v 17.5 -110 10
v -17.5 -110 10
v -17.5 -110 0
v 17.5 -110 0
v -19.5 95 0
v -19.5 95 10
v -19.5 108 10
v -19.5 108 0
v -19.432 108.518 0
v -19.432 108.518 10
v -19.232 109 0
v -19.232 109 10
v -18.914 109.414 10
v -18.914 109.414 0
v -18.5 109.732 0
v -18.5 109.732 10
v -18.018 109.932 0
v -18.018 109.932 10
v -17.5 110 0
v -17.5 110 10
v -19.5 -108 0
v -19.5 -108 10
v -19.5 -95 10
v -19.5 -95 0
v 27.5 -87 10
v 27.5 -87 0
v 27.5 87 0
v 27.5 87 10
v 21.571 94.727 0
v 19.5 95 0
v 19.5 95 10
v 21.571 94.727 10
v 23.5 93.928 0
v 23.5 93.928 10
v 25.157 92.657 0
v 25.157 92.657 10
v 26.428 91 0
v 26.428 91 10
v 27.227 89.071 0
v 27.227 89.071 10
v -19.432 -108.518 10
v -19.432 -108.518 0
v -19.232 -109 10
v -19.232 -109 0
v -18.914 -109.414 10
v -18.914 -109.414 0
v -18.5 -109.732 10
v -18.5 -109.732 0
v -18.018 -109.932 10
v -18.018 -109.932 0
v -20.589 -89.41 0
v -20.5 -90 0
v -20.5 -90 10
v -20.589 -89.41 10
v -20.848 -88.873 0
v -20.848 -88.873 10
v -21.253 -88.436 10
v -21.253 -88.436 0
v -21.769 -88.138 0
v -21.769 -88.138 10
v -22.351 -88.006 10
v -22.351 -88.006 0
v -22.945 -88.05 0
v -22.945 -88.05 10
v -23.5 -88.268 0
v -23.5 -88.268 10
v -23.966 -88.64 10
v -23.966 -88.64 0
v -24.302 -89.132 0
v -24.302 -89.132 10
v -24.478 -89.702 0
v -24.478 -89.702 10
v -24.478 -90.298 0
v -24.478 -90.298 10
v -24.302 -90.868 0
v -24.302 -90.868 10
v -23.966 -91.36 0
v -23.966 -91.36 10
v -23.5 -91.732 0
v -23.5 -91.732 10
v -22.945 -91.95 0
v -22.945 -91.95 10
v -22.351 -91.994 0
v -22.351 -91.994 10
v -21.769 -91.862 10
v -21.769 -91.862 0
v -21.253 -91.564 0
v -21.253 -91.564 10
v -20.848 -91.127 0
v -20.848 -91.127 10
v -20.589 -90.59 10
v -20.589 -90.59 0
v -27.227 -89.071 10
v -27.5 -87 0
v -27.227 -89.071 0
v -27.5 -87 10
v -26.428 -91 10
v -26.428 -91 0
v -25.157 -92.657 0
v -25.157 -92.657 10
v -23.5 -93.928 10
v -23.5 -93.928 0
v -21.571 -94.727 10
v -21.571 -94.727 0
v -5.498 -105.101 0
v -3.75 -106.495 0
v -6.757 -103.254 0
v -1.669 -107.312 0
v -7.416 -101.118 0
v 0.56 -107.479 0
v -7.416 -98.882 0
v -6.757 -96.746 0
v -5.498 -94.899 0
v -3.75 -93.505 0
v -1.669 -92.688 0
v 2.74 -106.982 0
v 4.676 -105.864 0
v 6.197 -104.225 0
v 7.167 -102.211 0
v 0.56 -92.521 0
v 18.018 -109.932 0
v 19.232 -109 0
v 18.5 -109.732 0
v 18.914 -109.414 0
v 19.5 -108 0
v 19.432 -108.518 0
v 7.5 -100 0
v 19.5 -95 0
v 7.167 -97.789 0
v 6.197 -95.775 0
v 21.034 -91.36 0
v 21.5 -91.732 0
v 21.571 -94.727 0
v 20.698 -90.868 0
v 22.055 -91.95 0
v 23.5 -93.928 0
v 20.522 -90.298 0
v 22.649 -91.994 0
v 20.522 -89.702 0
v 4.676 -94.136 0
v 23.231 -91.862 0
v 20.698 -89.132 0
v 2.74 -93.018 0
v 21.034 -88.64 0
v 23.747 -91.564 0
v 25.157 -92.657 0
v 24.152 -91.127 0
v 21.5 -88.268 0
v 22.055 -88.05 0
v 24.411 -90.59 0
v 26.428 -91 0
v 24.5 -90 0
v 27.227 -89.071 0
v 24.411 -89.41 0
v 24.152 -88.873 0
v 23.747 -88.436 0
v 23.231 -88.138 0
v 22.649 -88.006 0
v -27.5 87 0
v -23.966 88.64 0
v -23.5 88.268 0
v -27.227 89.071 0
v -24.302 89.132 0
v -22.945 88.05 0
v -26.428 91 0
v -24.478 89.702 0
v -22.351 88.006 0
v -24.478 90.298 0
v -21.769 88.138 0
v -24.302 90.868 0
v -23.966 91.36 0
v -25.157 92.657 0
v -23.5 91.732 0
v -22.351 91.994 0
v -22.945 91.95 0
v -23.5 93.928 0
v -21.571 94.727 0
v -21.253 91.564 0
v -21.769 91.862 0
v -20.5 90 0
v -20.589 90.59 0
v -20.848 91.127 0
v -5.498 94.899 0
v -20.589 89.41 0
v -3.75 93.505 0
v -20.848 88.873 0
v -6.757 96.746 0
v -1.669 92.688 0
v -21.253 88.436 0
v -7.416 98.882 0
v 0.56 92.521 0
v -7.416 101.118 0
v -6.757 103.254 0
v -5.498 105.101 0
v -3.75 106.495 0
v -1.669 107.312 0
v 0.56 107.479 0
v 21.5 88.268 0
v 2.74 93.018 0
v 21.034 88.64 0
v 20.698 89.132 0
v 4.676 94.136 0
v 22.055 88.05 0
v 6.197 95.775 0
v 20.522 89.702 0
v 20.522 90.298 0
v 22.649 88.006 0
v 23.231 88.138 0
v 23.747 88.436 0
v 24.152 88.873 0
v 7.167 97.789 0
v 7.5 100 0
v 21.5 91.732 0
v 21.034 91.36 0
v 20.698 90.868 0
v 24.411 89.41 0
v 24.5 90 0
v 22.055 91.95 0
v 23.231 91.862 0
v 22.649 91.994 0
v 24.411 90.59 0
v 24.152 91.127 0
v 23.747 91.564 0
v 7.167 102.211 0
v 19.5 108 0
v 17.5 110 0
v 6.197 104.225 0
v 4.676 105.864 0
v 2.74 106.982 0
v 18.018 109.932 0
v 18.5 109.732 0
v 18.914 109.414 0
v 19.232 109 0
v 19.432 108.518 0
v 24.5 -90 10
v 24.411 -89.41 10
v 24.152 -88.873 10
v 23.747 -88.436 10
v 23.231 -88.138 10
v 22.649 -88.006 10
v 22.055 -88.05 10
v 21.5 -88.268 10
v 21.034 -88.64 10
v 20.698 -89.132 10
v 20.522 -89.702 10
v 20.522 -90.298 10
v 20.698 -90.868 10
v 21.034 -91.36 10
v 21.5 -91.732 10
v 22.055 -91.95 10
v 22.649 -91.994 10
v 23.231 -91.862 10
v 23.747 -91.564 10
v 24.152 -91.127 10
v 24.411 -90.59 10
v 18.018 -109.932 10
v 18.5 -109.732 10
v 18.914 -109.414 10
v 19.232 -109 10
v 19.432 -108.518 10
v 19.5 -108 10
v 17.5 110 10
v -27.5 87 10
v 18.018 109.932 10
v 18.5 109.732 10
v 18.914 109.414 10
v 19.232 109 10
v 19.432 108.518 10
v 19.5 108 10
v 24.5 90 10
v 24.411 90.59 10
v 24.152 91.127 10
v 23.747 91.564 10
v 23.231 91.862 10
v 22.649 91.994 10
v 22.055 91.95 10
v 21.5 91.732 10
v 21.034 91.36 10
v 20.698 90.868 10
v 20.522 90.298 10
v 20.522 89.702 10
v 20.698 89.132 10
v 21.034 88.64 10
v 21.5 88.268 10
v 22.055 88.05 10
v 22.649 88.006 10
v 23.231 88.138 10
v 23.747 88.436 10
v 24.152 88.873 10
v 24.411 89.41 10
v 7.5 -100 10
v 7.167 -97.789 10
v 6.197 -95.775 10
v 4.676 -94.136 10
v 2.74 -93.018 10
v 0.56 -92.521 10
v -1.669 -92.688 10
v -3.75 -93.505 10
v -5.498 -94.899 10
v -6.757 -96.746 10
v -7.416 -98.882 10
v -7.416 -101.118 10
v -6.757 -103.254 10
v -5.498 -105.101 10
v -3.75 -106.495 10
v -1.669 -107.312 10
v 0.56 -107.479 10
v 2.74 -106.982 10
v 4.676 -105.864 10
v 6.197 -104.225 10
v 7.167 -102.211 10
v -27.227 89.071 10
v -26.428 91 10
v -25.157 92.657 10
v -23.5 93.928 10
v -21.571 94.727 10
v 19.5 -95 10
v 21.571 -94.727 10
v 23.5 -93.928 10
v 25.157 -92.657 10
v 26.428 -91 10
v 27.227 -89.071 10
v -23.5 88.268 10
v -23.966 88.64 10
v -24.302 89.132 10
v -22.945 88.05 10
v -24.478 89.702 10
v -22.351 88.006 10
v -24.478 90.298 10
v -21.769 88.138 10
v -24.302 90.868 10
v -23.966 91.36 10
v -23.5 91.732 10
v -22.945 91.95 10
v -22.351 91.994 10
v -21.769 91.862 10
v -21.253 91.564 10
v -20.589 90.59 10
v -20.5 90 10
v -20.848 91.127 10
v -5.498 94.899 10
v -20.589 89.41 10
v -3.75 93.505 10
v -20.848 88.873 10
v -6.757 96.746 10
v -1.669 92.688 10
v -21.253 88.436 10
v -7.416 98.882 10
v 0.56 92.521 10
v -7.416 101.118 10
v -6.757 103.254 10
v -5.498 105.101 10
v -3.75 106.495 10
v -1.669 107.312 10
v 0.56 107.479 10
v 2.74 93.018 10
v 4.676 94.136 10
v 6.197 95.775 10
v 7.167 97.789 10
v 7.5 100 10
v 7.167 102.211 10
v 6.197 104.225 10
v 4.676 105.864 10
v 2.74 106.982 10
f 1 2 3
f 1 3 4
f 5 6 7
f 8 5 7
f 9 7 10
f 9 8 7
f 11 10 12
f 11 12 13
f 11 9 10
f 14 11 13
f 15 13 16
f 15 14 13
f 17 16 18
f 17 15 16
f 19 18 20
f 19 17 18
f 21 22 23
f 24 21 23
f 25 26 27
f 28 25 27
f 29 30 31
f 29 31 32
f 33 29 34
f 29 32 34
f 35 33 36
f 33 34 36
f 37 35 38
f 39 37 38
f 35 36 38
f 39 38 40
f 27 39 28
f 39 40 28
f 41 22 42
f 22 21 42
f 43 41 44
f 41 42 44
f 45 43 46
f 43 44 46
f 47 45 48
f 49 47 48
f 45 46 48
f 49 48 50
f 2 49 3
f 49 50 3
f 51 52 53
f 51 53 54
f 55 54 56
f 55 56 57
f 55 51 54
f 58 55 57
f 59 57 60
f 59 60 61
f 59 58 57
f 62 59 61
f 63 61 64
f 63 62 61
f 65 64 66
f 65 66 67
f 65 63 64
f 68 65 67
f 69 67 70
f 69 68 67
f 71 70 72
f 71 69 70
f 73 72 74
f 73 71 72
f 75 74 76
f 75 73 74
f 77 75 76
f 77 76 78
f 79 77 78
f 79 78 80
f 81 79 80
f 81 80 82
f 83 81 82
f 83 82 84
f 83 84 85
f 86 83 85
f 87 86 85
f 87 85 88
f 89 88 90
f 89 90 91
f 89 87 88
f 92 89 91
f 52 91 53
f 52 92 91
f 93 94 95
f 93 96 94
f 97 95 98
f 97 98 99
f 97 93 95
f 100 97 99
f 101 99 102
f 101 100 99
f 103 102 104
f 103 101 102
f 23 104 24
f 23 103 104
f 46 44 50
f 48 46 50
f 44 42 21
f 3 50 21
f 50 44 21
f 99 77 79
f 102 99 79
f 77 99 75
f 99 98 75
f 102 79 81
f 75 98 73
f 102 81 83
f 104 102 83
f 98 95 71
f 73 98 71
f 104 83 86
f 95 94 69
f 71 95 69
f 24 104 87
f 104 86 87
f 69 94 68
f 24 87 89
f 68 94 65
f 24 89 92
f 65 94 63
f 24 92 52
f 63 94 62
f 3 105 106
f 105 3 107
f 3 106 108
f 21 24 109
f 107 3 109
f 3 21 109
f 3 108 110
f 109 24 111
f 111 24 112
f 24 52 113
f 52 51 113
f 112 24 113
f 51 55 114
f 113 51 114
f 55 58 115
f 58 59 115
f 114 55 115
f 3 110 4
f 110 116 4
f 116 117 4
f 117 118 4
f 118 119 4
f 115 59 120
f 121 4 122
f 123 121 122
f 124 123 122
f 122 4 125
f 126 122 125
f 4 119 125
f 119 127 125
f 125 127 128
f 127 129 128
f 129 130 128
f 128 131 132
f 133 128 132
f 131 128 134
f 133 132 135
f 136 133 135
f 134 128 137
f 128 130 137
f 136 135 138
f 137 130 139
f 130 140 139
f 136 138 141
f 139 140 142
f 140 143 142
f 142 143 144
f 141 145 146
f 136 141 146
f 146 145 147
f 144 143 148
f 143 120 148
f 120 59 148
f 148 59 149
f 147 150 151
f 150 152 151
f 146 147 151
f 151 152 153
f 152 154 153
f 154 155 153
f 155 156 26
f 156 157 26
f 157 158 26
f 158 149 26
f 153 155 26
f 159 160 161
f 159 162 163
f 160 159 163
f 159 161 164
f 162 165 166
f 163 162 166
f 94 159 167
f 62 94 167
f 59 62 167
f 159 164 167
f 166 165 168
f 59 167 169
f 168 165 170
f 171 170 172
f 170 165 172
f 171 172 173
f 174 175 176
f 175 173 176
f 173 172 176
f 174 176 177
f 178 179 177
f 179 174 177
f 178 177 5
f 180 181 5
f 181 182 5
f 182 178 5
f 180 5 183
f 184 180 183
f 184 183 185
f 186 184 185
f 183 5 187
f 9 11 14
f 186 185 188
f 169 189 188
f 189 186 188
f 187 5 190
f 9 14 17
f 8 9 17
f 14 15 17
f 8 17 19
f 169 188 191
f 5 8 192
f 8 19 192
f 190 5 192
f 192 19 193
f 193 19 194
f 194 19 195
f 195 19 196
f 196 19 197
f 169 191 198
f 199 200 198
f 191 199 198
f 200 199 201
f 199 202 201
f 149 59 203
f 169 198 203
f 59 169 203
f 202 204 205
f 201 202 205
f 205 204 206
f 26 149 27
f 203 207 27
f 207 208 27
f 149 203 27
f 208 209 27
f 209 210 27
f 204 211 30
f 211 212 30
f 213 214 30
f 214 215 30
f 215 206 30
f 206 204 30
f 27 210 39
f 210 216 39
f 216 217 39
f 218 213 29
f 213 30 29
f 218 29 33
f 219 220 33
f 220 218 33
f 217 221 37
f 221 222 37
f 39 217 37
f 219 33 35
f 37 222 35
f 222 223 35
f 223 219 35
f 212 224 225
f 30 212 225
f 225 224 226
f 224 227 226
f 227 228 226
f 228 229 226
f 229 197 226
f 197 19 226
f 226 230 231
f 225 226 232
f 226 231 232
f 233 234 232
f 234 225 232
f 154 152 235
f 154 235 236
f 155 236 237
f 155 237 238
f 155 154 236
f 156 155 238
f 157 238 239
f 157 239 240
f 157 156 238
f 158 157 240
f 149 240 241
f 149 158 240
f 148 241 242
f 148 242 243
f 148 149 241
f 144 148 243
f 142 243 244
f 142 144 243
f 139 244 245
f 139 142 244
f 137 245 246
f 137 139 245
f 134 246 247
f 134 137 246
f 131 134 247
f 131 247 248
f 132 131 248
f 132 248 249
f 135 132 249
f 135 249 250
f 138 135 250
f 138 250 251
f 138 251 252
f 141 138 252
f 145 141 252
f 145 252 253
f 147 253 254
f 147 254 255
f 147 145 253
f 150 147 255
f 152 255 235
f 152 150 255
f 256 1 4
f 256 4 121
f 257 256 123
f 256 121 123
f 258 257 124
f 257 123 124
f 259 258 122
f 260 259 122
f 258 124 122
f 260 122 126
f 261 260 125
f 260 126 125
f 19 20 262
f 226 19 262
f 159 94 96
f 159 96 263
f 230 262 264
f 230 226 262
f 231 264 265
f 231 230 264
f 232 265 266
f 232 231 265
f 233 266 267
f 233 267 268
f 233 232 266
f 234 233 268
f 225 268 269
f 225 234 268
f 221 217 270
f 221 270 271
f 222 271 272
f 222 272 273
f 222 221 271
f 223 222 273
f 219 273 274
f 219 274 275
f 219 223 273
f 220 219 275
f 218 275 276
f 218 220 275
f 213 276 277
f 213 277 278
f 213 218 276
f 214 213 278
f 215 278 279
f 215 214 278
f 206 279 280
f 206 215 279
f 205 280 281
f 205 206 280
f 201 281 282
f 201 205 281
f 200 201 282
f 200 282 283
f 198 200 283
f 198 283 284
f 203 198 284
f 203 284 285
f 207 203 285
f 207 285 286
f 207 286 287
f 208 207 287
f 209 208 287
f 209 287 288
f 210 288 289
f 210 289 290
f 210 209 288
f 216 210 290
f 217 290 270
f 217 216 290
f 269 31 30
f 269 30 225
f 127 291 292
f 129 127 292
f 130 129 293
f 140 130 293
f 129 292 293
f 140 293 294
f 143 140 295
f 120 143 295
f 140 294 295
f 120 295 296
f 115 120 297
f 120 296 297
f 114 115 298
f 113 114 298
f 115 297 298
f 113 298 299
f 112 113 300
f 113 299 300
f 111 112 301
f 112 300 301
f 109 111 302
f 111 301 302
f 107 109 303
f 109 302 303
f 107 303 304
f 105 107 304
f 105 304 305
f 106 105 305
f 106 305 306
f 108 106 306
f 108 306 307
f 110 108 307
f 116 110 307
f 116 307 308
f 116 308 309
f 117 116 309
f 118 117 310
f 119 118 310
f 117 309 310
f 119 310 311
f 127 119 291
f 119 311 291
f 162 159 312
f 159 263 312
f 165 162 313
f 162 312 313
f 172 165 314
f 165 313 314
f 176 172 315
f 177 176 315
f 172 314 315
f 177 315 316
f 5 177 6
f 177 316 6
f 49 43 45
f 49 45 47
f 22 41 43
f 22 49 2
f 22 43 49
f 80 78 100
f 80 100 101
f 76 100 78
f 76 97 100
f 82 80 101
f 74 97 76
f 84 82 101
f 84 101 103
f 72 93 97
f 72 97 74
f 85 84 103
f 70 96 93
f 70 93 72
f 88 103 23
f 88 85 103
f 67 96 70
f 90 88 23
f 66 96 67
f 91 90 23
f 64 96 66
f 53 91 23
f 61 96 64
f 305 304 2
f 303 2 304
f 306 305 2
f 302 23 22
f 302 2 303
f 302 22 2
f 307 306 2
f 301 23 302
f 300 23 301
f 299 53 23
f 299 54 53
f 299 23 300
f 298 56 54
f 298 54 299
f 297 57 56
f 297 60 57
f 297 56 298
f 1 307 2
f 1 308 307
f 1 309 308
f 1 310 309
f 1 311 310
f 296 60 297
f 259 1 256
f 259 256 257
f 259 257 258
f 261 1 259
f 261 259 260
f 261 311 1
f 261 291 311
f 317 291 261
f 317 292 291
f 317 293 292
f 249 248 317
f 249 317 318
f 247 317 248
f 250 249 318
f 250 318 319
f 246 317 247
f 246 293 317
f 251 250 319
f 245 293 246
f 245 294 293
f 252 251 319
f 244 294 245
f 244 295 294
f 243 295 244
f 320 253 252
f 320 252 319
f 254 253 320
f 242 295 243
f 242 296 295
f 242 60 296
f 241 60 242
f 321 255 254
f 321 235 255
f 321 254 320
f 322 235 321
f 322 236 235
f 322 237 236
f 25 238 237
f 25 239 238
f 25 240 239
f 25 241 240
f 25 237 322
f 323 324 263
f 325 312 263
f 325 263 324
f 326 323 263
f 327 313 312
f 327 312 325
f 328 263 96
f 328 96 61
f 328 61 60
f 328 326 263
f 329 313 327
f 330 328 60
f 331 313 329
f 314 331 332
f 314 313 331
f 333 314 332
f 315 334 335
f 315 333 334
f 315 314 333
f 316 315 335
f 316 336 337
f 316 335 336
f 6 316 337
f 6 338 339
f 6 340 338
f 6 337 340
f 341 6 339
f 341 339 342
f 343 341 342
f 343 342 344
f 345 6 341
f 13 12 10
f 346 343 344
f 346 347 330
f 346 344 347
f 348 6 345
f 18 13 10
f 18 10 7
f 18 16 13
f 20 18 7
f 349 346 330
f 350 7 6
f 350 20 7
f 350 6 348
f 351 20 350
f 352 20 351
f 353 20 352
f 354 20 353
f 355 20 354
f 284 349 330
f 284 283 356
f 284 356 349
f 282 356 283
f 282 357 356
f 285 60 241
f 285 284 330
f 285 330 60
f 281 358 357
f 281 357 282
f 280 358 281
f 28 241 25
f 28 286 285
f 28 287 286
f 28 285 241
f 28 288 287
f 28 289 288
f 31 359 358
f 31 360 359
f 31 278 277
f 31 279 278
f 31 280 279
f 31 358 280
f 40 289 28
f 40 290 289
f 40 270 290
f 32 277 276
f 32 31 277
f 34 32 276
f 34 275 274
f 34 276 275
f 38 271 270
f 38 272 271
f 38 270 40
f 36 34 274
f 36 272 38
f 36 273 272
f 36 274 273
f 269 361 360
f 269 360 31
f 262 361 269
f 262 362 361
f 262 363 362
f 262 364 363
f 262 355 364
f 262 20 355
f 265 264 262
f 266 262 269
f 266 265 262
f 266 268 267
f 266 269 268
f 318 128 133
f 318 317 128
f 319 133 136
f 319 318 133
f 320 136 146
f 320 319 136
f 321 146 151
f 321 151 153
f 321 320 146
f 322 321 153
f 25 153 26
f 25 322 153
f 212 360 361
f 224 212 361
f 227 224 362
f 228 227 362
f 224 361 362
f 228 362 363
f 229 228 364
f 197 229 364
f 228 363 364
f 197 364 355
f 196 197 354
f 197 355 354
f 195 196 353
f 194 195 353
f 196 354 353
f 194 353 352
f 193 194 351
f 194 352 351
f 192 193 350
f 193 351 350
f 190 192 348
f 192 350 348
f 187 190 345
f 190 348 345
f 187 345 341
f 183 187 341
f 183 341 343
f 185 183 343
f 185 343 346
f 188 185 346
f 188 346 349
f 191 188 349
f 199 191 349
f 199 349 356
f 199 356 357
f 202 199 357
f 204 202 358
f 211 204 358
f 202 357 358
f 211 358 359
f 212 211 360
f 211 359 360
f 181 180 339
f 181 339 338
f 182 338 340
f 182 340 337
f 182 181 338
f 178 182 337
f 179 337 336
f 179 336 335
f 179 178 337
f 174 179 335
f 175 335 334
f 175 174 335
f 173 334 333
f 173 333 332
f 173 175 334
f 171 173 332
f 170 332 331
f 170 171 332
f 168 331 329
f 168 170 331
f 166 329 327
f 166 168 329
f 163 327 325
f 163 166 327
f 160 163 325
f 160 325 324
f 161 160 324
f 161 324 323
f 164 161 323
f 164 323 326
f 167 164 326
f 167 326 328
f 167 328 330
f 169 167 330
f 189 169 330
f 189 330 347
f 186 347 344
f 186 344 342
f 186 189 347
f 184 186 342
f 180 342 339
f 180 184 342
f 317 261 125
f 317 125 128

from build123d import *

# Parameters (mm, degrees)
ESBO_O1_W                = 55
ESBO_O1_H                = 190
ESBO_O1_R                = 2
RESSALTO_EXTRUS_O1_DEPTH = 10
FILETE1_R                = 8
ESBO_O3_W                = 39
ESBO_O3_H                = 15
RESSALTO_EXTRUS_O2_DEPTH = 10
ESBO_O4_R                = 7.5
CORTE_EXTRUS_O2_DEPTH    = 10
FILETE2_R                = 2


with BuildPart() as part:
    # Esboço1 → Ressalto-extrusão1 (new body)
    with BuildSketch(Plane.XY):
        Rectangle(ESBO_O1_W, ESBO_O1_H)
        with Locations((-22.5, 90)):
            Circle(ESBO_O1_R, mode=Mode.SUBTRACT)
        with Locations((22.5, 90)):
            Circle(ESBO_O1_R, mode=Mode.SUBTRACT)
        with Locations((-22.5, -90)):
            Circle(ESBO_O1_R, mode=Mode.SUBTRACT)
        with Locations((22.5, -90)):
            Circle(ESBO_O1_R, mode=Mode.SUBTRACT)
    extrude(amount=RESSALTO_EXTRUS_O1_DEPTH)

    # Filete1
    filete1_edges = [part.edges().sort_by_distance(p)[0] for p in [
        (27.5, -95, 5),
        (-27.5, -95, 5),
        (-27.5, 95, 5),
        (27.5, 95, 5),
    ]]
    fillet(filete1_edges, radius=FILETE1_R)

    # Esboço3 → Ressalto-extrusão2 (add)
    with BuildSketch(Plane.XY.offset(10)):
        with Locations((0, 102.5)):
            Rectangle(ESBO_O3_W, ESBO_O3_H)
        with Locations((0, -102.5)):
            Rectangle(ESBO_O3_W, ESBO_O3_H)
    extrude(amount=-RESSALTO_EXTRUS_O2_DEPTH)

    # Esboço4 → Corte-extrusão2 (cut)
    with BuildSketch(Plane.XY.offset(10)):
        with Locations((0, 100)):
            Circle(ESBO_O4_R)
        with Locations((0, -100)):
            Circle(ESBO_O4_R)
    extrude(amount=-CORTE_EXTRUS_O2_DEPTH, mode=Mode.SUBTRACT)

    # Filete2
    filete2_edges = [part.edges().sort_by_distance(p)[0] for p in [
        (-19.5, 110, 5),
        (19.5, 110, 5),
        (-19.5, -110, 5),
        (19.5, -110, 5),
    ]]
    fillet(filete2_edges, radius=FILETE2_R)


solid = part.part
